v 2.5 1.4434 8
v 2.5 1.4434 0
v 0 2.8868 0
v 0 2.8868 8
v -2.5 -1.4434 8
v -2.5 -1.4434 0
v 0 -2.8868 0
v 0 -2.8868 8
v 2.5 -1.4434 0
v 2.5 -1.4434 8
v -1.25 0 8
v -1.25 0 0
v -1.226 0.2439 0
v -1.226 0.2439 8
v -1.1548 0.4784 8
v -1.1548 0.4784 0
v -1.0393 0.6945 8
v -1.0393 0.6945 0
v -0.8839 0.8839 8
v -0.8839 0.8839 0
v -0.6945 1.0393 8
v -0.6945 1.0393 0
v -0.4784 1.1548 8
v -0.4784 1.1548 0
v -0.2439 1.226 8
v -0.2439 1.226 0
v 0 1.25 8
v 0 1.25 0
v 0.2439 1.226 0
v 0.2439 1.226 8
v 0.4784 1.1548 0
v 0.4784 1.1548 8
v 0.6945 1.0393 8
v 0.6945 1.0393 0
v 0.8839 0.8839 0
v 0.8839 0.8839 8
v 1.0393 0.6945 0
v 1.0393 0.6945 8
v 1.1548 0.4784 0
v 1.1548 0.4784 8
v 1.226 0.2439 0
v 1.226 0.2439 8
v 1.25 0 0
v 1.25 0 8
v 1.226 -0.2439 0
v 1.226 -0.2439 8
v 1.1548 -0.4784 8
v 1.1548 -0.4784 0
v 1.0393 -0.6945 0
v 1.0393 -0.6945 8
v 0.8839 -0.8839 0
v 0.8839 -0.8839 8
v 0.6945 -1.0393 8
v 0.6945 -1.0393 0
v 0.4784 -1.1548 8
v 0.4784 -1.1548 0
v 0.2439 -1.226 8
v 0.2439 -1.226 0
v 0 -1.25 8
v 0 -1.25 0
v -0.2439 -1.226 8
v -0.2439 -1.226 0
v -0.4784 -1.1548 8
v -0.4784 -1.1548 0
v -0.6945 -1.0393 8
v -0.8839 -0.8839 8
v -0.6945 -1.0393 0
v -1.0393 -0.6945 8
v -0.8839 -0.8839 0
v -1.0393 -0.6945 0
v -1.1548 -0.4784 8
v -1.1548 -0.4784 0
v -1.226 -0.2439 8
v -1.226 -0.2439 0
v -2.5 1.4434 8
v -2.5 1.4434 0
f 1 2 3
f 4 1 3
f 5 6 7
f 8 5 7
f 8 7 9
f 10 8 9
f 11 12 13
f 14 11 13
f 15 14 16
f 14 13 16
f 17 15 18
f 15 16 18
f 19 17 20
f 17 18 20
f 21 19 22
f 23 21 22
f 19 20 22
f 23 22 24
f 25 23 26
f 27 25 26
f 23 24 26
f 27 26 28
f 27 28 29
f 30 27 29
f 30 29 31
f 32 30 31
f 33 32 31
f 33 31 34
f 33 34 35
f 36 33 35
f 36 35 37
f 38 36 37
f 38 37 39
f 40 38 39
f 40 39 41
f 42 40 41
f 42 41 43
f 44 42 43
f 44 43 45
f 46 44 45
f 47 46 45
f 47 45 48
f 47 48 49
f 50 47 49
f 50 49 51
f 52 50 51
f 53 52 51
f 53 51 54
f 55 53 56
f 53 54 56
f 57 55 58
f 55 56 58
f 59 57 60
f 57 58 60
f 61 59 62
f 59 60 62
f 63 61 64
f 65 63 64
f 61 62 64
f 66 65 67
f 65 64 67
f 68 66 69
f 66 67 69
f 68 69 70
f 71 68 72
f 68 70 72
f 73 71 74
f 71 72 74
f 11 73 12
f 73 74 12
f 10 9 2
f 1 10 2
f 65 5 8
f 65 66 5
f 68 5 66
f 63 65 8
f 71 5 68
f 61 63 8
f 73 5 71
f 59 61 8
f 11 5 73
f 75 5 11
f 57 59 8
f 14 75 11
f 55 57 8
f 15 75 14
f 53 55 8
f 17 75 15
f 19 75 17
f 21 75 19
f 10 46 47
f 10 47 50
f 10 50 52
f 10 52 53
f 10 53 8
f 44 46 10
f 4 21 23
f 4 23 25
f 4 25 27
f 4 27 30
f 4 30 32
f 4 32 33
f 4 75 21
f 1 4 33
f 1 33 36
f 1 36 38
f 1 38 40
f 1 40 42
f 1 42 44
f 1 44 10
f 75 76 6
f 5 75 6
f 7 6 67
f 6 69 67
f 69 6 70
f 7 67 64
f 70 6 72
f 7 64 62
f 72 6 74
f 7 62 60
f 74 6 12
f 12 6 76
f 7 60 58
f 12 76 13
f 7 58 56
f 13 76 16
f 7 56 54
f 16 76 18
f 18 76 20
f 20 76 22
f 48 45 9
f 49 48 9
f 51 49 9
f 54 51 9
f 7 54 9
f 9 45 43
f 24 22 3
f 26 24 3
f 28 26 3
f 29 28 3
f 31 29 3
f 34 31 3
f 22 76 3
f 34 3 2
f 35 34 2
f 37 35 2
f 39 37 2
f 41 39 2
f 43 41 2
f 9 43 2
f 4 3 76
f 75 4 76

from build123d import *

# Parameters (mm, degrees)
BOSS_EXTRU_1_DEPTH                            = 8
TROU_POUR_TARAUDAGE_POUR_TROU_TARAUD_M3_D     = 2.5
TROU_POUR_TARAUDAGE_POUR_TROU_TARAUD_M3_DEPTH = 8


with BuildPart() as part:
    # Esquisse1 → Boss.-Extru.1 (new body)
    with BuildSketch(Plane.XY):
        Polygon((2.5, -1.443375673), (2.5, 1.443375673), (0, 2.886751346), (-2.5, 1.443375673), (-2.5, -1.443375673), (0, -2.886751346), align=None)
    extrude(amount=BOSS_EXTRU_1_DEPTH)

    # Trou pour taraudage pour trou taraudé M31
    with Locations(Plane.XY.offset(8)):
        with Locations((0, 0)):
            Hole(TROU_POUR_TARAUDAGE_POUR_TROU_TARAUD_M3_D / 2, depth=TROU_POUR_TARAUDAGE_POUR_TROU_TARAUD_M3_DEPTH)


solid = part.part
